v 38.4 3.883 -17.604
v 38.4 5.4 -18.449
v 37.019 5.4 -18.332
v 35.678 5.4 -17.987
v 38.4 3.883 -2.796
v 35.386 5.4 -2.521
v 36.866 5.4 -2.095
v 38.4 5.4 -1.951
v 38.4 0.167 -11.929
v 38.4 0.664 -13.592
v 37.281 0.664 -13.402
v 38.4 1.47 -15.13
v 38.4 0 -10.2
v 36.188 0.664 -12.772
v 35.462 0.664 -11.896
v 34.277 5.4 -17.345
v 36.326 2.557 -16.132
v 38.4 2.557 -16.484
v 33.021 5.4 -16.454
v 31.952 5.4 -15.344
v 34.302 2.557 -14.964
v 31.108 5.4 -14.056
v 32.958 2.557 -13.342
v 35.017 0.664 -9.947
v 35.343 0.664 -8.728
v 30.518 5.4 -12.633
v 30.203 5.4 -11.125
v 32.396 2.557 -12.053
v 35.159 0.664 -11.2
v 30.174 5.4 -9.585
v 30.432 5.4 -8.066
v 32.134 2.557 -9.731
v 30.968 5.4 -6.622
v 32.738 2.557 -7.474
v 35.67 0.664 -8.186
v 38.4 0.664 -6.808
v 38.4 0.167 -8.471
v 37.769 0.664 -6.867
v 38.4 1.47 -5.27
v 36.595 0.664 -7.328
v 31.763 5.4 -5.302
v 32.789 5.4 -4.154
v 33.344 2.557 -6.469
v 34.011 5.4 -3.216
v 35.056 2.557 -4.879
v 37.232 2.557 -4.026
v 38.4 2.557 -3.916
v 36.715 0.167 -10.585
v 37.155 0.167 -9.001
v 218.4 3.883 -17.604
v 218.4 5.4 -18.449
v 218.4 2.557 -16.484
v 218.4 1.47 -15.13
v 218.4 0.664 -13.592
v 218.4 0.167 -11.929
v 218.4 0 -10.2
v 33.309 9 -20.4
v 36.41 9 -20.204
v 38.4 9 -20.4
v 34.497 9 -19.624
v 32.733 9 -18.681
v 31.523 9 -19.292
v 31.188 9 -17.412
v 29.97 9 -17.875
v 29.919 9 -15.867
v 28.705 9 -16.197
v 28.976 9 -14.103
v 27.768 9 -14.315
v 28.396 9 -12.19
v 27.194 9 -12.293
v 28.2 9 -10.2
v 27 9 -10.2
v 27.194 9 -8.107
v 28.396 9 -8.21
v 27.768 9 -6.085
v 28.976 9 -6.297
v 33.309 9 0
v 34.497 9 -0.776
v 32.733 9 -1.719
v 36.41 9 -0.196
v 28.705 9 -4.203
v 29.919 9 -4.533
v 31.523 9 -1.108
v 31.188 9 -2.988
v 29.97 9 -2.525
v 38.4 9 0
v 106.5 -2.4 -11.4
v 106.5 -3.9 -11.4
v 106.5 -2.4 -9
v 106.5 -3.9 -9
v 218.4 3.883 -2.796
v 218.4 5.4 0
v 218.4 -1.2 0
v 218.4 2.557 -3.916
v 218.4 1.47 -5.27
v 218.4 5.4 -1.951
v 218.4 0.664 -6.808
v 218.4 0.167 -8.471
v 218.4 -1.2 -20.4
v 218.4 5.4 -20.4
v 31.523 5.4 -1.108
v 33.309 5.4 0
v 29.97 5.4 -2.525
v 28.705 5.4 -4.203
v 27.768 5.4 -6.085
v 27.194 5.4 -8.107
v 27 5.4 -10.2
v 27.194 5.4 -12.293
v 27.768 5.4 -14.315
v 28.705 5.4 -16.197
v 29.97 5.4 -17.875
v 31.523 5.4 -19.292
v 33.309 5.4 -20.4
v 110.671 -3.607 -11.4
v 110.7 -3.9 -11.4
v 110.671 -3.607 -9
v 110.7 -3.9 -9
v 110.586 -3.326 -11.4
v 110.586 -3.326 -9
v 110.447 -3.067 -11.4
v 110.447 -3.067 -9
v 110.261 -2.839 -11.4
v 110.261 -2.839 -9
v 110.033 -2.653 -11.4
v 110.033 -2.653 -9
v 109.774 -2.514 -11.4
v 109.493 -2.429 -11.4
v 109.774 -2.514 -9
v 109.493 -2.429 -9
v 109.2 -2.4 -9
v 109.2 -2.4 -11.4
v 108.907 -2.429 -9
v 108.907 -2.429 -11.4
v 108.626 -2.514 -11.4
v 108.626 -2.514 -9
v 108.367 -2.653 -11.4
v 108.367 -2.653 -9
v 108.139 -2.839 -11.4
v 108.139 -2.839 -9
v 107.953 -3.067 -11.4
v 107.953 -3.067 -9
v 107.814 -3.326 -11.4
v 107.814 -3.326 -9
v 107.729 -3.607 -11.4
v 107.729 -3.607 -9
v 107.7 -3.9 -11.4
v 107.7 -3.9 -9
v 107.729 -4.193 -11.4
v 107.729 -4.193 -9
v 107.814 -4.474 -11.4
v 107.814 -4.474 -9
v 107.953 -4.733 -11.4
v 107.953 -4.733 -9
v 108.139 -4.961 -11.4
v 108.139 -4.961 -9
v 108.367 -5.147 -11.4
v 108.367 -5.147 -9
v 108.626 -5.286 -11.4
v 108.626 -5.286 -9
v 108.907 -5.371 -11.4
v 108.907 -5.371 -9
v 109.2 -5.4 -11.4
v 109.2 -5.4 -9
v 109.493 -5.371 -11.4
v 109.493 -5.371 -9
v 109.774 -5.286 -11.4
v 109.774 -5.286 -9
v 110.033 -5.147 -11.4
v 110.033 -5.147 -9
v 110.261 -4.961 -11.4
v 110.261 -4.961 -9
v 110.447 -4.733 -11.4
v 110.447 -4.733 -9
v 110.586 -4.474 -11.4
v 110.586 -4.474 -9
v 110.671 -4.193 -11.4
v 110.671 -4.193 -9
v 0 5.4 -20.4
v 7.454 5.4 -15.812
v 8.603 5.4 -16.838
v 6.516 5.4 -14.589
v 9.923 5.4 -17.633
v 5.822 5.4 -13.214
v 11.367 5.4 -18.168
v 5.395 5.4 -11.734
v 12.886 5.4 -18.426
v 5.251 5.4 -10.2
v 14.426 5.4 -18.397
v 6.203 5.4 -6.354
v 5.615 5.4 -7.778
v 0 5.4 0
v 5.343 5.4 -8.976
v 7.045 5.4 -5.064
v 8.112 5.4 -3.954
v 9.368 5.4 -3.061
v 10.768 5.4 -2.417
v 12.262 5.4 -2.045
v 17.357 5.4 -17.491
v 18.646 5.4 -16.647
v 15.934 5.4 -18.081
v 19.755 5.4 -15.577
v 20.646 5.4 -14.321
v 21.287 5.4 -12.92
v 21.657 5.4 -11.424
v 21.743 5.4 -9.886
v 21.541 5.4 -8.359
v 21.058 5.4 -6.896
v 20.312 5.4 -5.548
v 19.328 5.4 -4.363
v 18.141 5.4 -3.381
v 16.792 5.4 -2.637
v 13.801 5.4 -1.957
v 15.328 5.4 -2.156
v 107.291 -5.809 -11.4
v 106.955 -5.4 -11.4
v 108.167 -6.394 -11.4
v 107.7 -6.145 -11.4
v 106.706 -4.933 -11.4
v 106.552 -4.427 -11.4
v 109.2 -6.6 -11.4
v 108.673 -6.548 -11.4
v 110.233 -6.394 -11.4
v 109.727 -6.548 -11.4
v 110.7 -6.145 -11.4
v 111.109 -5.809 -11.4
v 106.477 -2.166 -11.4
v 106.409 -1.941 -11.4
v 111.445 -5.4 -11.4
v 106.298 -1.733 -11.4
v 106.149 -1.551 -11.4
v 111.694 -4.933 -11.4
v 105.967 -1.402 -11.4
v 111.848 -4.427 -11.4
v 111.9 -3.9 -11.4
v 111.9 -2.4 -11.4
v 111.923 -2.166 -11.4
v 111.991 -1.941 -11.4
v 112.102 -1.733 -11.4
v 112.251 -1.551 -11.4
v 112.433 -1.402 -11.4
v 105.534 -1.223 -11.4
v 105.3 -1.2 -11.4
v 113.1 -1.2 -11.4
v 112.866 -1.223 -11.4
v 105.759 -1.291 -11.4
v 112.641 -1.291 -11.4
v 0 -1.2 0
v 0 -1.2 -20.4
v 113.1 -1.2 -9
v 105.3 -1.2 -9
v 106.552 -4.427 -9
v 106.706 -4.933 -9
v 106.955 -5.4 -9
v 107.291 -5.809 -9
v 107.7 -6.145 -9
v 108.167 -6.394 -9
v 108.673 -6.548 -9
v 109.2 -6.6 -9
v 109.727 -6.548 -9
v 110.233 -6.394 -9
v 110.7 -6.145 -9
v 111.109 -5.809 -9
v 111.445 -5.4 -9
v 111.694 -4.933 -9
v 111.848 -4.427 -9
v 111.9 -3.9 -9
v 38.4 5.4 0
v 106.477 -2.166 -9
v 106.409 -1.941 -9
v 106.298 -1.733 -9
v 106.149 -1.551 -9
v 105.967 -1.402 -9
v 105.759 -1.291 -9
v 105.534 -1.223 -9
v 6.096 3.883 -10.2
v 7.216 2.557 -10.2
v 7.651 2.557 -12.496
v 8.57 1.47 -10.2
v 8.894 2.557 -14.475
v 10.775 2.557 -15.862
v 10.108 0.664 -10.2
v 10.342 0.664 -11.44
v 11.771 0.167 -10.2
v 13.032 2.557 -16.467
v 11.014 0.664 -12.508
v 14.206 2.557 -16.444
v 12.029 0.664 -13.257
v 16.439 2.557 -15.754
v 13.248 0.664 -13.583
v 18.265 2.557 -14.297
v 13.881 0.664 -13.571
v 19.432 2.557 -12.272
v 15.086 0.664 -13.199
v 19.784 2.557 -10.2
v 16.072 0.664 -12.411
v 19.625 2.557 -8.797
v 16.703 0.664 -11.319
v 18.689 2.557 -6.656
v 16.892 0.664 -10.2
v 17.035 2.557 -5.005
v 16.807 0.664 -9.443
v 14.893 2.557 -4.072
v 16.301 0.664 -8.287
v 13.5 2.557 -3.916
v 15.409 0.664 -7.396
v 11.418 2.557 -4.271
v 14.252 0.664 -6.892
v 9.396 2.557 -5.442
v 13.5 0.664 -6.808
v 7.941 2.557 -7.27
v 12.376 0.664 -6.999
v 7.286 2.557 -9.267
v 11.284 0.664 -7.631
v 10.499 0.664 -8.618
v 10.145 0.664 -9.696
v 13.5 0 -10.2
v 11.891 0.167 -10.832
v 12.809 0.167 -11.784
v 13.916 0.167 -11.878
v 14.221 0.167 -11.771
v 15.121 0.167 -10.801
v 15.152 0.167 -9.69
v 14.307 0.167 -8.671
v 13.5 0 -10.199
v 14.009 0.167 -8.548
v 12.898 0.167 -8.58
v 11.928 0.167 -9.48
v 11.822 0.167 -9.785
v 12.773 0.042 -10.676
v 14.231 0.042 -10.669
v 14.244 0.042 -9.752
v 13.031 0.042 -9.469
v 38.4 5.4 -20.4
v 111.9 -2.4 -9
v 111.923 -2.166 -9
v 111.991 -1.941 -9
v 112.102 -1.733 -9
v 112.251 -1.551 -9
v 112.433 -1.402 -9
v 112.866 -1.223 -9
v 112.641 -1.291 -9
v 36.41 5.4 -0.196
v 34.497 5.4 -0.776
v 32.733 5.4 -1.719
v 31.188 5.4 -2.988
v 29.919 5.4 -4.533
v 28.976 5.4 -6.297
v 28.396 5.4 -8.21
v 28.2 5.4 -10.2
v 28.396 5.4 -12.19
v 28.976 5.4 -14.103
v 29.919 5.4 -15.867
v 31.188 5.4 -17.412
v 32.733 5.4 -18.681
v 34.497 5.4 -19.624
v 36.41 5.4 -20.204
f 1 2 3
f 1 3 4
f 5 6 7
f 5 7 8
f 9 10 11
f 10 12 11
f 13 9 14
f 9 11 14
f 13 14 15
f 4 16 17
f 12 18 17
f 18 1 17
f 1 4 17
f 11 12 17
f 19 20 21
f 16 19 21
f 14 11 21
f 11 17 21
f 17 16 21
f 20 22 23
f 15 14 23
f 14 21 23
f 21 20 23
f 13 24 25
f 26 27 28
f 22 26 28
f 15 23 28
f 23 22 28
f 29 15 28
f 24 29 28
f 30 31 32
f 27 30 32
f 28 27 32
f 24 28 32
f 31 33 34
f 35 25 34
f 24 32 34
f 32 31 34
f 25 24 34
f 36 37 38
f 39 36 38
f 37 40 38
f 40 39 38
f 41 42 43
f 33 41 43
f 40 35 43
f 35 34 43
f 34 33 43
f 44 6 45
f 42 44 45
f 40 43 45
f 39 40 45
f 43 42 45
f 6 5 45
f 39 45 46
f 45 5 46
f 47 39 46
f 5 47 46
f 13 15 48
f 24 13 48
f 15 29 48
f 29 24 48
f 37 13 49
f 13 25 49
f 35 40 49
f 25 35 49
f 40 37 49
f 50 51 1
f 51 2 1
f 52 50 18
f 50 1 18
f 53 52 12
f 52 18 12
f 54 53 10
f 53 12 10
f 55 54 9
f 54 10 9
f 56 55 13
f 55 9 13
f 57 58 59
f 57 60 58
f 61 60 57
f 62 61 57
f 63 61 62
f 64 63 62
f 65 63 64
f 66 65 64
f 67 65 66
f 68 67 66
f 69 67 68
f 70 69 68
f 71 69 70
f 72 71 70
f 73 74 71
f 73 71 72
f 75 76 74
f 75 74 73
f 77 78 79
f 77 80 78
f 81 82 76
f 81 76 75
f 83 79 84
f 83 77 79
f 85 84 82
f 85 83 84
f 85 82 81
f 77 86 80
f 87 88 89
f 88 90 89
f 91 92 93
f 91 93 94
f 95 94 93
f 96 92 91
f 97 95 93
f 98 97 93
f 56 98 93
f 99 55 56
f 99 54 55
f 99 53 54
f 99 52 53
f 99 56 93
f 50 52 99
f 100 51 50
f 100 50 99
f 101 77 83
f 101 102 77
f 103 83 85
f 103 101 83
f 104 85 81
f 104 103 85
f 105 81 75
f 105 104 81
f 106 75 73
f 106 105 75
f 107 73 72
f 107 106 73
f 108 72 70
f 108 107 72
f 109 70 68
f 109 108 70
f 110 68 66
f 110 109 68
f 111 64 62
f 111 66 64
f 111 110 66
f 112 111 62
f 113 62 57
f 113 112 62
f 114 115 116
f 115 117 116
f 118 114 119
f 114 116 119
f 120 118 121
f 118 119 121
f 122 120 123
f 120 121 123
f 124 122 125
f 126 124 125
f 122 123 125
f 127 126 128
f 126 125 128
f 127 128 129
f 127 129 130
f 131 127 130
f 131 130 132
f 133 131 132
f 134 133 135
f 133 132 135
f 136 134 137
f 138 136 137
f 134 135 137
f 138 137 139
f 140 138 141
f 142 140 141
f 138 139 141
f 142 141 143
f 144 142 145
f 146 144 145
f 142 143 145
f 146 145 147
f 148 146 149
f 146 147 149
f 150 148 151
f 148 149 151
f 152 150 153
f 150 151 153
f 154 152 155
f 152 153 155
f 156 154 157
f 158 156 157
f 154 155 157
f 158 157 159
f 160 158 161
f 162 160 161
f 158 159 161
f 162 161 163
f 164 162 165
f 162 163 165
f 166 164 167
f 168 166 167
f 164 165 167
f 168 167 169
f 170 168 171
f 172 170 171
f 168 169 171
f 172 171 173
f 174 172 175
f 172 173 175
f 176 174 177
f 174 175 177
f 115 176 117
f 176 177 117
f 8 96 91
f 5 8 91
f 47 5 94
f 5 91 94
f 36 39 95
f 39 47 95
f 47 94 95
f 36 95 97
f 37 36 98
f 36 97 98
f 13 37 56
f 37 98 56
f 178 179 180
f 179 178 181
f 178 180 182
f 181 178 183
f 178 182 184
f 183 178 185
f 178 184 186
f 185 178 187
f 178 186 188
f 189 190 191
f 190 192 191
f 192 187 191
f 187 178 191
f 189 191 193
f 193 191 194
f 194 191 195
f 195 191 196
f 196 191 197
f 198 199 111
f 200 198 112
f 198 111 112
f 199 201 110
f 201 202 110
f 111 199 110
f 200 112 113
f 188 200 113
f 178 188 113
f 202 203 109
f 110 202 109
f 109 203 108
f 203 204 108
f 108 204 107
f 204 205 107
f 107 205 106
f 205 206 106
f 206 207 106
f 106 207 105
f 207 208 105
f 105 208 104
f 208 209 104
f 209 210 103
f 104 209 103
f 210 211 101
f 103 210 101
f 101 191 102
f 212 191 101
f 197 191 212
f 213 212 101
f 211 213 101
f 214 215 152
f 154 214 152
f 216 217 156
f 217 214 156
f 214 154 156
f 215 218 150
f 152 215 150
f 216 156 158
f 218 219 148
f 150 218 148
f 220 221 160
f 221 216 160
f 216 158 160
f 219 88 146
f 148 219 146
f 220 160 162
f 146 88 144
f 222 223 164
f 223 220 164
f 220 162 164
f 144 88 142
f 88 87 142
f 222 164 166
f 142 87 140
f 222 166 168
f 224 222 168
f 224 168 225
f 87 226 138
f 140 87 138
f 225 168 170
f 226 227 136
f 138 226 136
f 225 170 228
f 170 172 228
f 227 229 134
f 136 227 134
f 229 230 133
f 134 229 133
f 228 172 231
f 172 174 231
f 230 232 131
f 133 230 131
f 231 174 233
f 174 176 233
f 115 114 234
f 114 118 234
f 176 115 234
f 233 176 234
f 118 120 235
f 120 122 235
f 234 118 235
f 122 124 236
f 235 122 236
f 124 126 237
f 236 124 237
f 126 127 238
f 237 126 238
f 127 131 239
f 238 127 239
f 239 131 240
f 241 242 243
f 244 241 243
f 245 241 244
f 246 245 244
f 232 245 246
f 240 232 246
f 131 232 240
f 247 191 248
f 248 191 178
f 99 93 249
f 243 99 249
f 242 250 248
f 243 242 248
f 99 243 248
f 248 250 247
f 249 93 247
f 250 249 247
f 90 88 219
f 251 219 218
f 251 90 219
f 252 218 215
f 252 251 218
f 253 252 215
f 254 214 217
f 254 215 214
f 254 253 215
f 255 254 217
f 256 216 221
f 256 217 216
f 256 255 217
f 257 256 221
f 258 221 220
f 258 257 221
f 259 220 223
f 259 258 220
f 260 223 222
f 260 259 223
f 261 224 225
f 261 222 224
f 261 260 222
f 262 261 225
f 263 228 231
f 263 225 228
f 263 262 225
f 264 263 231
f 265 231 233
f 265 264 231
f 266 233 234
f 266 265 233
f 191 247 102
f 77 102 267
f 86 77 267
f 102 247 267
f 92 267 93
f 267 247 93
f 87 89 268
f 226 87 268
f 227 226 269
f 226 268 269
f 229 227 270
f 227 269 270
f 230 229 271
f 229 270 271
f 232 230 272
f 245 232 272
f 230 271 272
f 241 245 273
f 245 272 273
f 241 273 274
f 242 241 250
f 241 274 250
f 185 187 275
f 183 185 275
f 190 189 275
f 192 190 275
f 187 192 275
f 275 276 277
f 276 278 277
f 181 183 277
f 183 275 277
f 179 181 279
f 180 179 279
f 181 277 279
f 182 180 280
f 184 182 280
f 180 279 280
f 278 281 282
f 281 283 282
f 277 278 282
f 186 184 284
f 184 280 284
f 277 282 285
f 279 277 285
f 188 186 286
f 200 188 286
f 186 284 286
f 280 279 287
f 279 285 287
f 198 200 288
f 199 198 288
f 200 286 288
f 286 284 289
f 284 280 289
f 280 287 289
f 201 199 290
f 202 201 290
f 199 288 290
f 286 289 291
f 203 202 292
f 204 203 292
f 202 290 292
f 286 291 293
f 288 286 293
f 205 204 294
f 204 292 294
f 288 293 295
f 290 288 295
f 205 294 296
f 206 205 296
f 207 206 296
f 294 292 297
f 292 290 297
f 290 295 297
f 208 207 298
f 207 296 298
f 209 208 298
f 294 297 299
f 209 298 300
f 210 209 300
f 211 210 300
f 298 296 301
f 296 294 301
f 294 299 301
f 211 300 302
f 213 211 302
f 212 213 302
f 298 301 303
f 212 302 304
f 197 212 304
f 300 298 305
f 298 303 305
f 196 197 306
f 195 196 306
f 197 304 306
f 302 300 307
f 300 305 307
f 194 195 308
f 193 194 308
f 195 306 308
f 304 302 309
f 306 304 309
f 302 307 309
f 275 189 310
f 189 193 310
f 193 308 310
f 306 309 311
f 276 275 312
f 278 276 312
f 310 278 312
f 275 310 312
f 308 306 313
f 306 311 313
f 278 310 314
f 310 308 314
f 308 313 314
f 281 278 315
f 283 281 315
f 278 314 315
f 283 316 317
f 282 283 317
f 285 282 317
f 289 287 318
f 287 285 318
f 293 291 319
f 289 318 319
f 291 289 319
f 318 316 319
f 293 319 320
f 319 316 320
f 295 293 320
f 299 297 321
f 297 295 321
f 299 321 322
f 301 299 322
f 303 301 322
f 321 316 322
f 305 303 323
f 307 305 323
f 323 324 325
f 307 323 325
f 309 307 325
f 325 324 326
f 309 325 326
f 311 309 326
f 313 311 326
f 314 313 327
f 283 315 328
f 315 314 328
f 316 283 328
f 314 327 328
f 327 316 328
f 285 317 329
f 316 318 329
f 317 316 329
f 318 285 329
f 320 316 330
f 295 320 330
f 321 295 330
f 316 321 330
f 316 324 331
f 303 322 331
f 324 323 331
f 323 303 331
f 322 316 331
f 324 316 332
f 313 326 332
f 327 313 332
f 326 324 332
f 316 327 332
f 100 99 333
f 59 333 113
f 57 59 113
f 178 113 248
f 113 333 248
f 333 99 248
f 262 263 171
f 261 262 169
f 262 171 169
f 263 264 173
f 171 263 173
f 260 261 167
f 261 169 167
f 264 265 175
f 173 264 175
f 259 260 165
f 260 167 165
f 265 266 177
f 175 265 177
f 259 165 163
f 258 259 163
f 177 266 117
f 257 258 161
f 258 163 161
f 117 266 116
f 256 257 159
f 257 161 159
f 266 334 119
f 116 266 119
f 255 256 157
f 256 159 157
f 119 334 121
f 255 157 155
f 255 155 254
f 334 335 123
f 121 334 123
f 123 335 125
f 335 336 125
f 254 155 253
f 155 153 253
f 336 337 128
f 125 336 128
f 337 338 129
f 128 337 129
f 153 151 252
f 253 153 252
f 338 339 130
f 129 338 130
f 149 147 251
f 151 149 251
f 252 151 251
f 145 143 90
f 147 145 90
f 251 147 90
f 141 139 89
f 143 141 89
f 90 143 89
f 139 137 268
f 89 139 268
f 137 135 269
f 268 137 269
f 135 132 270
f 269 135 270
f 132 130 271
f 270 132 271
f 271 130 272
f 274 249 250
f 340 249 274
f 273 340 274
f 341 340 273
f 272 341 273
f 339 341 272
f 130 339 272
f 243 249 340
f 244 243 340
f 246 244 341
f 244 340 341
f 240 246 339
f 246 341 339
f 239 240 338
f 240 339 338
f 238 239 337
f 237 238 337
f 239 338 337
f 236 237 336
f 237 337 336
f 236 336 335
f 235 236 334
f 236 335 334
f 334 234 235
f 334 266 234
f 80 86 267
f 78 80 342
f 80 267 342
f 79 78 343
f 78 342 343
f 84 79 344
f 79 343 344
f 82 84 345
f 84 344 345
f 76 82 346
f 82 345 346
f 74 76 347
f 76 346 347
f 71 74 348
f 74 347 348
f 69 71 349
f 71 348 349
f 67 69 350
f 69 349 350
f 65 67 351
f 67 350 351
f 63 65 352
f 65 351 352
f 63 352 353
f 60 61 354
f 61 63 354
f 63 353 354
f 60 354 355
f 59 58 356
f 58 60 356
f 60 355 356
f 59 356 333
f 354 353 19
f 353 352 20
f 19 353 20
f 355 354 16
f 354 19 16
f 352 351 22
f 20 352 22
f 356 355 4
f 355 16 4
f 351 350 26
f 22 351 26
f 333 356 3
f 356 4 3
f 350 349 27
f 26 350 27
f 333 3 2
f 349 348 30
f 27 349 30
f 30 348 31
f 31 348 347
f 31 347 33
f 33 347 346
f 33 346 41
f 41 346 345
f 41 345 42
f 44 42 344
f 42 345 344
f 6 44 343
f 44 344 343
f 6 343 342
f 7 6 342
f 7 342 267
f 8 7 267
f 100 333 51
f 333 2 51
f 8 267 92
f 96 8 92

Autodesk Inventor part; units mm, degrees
ref_plane "YZ Plane" through (0, 0, 0) normal (1, 0, 0) x (0, 1, 0)
ref_plane "XZ Plane" through (0, 0, 0) normal (0, 1, 0) x (-1, 0, 0)
ref_plane "XY Plane" through (0, 0, 0) normal (0, 0, 1) x (1, 0, 0)
sketch "Esboço2" plane through (0, 0, 0) normal (0, 1, 0) x (-1, 0, 0)
  line L0 (-33.3088, 0) -> (-218.4, 0)
  line L1 (-218.4, 0) -> (-218.4, -20.4)
  line L2 (-218.4, -20.4) -> (-33.3088, -20.4)
  line L3 (-38.4, -19.2) -> (-218.4, -19.2)
  line L4 (-218.4, -1.2) -> (-38.4, -1.2)
  circle A0 centre (-38.4, -10.2) radius 9
  line L5 (-47.4, -20.4) -> (-47.4, -19.2)
  line L6 (-47.4, -1.2) -> (-47.4, 0)
  arc A1 (-33.3088, -20.4) -> (-33.3088, 0) centre (-38.4, -10.2) ccw
  arc A2 (-38.4, -20.4) -> (-38.4, 0) centre (-38.4, -10.2) ccw
  line L7 (-33.3088, 0) -> (0, 0)
  line L8 (0, 0) -> (0, -20.4)
  line L9 (0, -20.4) -> (-33.3088, -20.4)
  circle A3 centre (-13.5, -10.2) radius 9
  point P0 (0, -10.2)
  point P1 (-33.3088, -20.4)
  dimension "d6" = 20.4
  dimension "d8" = 1.2
  dimension "d11" = 1.2
  dimension "d25" = 18
  dimension "d44" = 1.2
  dimension "d45" = 1.2
  dimension "d46" = 180
  dimension "d47" = 27
  dimension "d48" = 18
  dimension "d49" = 13.5
extrude "Extrusão1" add sketch "Esboço2" against normal blind 1.2 contours A1 L2 A2 L0 | L7 L8 L9 A1 | A2 L2 L5 L3 A0 L4 L6 L0 | L6 L4 L1 L0 | L4 A0 L3 L1 | L2 L1 L3 L5 | A0 | A3
extrude "Extrusão2" add sketch "Esboço2" along normal blind 9 contours L7 L8 L9 A1 | A2 L2 L5 L3 A0 L4 L6 L0 | L6 L4 L1 L0 | L2 L1 L3 L5
fillet "Arredondamento6" radius 9 4 edges at (128.4, 0, -1.2) (128.4, 0, -19.2) (29.4, 0, -10.2) (22.5, 0, -10.2)
sketch "Esboço6" plane through (0, -1.2, 0) normal (0, 0, 1) x (1, 0, 0)
  line L0 (218.4, 10.2) -> (0, 10.2)
  line L1 (0, 10.2) -> (0, 6.6)
  line L2 (0, 6.6) -> (218.4, 6.6)
  line L3 (218.4, 6.6) -> (218.4, 10.2)
  line L4 (218.4, 1.2) -> (218.4, 10.2) projected
  line L5 (0, 10.2) -> (0, 0) projected
  line L6 (38.4, 10.2) -> (218.4, 10.2) projected
  line L7 (38.4, 1.2) -> (218.4, 1.2) projected
  point P0 (0, 1.2)
  point P1 (218.4, 8.4)
  point P2 (218.4, 5.7)
  point P3 (0, 8.4)
  point P4 (0, 5.1)
  point P5 (109.2, 10.2)
  point P6 (128.4, 10.2)
  dimension "d50" = 5.4
extrude "Extrusão8" cut sketch "Esboço6" against normal up to surface (20.4 mm away)
extrude "Extrusão9" add sketch "Esboço2" along normal blind 9 contours A1 L2 A2 L0
sketch "Esboço7" plane through (0, -1.2, 0) normal (0, -1, 0) x (1, 0, 0)
  line L0 (105.3, -11.4) -> (113.1, -11.4)
  line L1 (113.1, -11.4) -> (113.1, -9)
  line L2 (113.1, -9) -> (105.3, -9)
  line L3 (105.3, -9) -> (105.3, -11.4)
  line L4 (0, 0) -> (0, -20.4) projected
  line L5 (218.4, -20.4) -> (218.4, 0) projected
  arc A0 (38.4, 0) -> (38.4, -20.4) centre (38.4, -10.2) ccw projected
  line L6 (218.4, 0) -> (0, 0) projected
  point P0 (105.3, -10.2)
  point P1 (0, -10.2)
  point P2 (109.2, -9)
  point P3 (0, -10.2)
  point P4 (28.2, -10.2)
  point P5 (109.2, 0)
  dimension "d56" = 7.8
  dimension "d57" = 2.4
  dimension "d76" = 105.3
  dimension "d77" = 105.3
extrude "Extrusão10" add sketch "Esboço7" along normal blind 5.4
sketch "Esboço8" plane through (105.3, -1.2, -9) normal (0, 0, 1) x (1, 0, 0)
  circle A0 centre (3.9, -2.7) radius 1.5
  line L0 (113.1, 0) -> (-105.3, 0) projected
  arc A1 (1.2, -2.7) -> (6.6, -2.7) centre (3.9, -2.7) ccw
  line L1 (1.2, -2.7) -> (1.2, -1.2)
  line L2 (6.6, -2.7) -> (6.6, -1.2)
  line L3 (0, 0) -> (0, 0)
  line L4 (7.8, 0) -> (7.8, 0)
  line L5 (0, 0) -> (0, -5.4) projected
  line L6 (0, 0) -> (0, -5.4)
  line L7 (7.8, 0) -> (7.8, -5.4) projected
  line L8 (0, -5.4) -> (7.8, -5.4)
  line L9 (7.8, -5.4) -> (7.8, 0)
  arc A2 (1.2, -1.2) -> (0, 0) centre (0, -1.2) ccw
  arc A3 (7.8, 0) -> (6.6, -1.2) centre (7.8, -1.2) ccw
  point P0 (-105.3, 1.2)
  point P1 (3.9, 0)
  point P2 (1.2, 0)
  point P3 (6.6, 0)
  point P4 (1.2, 0)
  point P5 (6.6, 0)
  point P6 (0, 0)
  point P7 (3.9, 0)
  point P8 (7.8, 0)
  point P9 (3.9, -5.4)
  point P10 (3.9, -5.4)
  dimension "d61" = 3
  dimension "d62" = 2.7
  dimension "d65" = 1.2
  dimension "d66" = 1.2
extrude "Extrusão11" cut sketch "Esboço8" against normal up to surface (2.4 mm away) contours A0 | L7 L8 A1 L2 A3 | A2 L1 A1 L8 L5
equation "\"d6\" = Diâmetro_esfera + 2 * Margem"
equation "\"d8\" = Margem"
equation "\"d11\" = Margem"
equation "\"d25\" = Diâmetro_esfera"
equation "\"d44\" = Margem"
equation "\"d45\" = Margem"
equation "\"d46\" = 10 * Diâmetro_esfera"
equation "\"d48\" = Diâmetro_esfera"
equation "\"d49\" = 0.5 * d47"
equation "\"d13\" = Margem"
equation "\"d15\" = 0.5 * Diâmetro_esfera"
equation "\"d55\" = 0.5 * Diâmetro_esfera"
equation "\"d50\" = 0.3 * Diâmetro_esfera"
equation "\"d53\" = 0.5 * Diâmetro_esfera"
equation "\"d56\" = Parafuso + 4 * Margem"
equation "\"d57\" = 2 * Margem"
equation "\"d59\" = Parafuso + 2 * Margem"
equation "\"d61\" = Parafuso"
equation "\"d62\" = 0.5 * Parafuso + Margem"
equation "\"d65\" = Margem"
equation "\"d67\" = Parafuso + 2 * Margem"
equation "\"Diâmetro_esfera\" = 18"
equation "\"Margem\" = 3 * Filamento"
equation "\"Filamento\" = 0.4"
equation "\"Parafuso\" = 3"
equation "\"d42\" = Margem"
equation "\"d43\" = Margem"
equation "\"Tamanho_receptor\" = 37.257"
properties part number "Trilho 60 minutos  - 12 horas" material "Plástico PET"
